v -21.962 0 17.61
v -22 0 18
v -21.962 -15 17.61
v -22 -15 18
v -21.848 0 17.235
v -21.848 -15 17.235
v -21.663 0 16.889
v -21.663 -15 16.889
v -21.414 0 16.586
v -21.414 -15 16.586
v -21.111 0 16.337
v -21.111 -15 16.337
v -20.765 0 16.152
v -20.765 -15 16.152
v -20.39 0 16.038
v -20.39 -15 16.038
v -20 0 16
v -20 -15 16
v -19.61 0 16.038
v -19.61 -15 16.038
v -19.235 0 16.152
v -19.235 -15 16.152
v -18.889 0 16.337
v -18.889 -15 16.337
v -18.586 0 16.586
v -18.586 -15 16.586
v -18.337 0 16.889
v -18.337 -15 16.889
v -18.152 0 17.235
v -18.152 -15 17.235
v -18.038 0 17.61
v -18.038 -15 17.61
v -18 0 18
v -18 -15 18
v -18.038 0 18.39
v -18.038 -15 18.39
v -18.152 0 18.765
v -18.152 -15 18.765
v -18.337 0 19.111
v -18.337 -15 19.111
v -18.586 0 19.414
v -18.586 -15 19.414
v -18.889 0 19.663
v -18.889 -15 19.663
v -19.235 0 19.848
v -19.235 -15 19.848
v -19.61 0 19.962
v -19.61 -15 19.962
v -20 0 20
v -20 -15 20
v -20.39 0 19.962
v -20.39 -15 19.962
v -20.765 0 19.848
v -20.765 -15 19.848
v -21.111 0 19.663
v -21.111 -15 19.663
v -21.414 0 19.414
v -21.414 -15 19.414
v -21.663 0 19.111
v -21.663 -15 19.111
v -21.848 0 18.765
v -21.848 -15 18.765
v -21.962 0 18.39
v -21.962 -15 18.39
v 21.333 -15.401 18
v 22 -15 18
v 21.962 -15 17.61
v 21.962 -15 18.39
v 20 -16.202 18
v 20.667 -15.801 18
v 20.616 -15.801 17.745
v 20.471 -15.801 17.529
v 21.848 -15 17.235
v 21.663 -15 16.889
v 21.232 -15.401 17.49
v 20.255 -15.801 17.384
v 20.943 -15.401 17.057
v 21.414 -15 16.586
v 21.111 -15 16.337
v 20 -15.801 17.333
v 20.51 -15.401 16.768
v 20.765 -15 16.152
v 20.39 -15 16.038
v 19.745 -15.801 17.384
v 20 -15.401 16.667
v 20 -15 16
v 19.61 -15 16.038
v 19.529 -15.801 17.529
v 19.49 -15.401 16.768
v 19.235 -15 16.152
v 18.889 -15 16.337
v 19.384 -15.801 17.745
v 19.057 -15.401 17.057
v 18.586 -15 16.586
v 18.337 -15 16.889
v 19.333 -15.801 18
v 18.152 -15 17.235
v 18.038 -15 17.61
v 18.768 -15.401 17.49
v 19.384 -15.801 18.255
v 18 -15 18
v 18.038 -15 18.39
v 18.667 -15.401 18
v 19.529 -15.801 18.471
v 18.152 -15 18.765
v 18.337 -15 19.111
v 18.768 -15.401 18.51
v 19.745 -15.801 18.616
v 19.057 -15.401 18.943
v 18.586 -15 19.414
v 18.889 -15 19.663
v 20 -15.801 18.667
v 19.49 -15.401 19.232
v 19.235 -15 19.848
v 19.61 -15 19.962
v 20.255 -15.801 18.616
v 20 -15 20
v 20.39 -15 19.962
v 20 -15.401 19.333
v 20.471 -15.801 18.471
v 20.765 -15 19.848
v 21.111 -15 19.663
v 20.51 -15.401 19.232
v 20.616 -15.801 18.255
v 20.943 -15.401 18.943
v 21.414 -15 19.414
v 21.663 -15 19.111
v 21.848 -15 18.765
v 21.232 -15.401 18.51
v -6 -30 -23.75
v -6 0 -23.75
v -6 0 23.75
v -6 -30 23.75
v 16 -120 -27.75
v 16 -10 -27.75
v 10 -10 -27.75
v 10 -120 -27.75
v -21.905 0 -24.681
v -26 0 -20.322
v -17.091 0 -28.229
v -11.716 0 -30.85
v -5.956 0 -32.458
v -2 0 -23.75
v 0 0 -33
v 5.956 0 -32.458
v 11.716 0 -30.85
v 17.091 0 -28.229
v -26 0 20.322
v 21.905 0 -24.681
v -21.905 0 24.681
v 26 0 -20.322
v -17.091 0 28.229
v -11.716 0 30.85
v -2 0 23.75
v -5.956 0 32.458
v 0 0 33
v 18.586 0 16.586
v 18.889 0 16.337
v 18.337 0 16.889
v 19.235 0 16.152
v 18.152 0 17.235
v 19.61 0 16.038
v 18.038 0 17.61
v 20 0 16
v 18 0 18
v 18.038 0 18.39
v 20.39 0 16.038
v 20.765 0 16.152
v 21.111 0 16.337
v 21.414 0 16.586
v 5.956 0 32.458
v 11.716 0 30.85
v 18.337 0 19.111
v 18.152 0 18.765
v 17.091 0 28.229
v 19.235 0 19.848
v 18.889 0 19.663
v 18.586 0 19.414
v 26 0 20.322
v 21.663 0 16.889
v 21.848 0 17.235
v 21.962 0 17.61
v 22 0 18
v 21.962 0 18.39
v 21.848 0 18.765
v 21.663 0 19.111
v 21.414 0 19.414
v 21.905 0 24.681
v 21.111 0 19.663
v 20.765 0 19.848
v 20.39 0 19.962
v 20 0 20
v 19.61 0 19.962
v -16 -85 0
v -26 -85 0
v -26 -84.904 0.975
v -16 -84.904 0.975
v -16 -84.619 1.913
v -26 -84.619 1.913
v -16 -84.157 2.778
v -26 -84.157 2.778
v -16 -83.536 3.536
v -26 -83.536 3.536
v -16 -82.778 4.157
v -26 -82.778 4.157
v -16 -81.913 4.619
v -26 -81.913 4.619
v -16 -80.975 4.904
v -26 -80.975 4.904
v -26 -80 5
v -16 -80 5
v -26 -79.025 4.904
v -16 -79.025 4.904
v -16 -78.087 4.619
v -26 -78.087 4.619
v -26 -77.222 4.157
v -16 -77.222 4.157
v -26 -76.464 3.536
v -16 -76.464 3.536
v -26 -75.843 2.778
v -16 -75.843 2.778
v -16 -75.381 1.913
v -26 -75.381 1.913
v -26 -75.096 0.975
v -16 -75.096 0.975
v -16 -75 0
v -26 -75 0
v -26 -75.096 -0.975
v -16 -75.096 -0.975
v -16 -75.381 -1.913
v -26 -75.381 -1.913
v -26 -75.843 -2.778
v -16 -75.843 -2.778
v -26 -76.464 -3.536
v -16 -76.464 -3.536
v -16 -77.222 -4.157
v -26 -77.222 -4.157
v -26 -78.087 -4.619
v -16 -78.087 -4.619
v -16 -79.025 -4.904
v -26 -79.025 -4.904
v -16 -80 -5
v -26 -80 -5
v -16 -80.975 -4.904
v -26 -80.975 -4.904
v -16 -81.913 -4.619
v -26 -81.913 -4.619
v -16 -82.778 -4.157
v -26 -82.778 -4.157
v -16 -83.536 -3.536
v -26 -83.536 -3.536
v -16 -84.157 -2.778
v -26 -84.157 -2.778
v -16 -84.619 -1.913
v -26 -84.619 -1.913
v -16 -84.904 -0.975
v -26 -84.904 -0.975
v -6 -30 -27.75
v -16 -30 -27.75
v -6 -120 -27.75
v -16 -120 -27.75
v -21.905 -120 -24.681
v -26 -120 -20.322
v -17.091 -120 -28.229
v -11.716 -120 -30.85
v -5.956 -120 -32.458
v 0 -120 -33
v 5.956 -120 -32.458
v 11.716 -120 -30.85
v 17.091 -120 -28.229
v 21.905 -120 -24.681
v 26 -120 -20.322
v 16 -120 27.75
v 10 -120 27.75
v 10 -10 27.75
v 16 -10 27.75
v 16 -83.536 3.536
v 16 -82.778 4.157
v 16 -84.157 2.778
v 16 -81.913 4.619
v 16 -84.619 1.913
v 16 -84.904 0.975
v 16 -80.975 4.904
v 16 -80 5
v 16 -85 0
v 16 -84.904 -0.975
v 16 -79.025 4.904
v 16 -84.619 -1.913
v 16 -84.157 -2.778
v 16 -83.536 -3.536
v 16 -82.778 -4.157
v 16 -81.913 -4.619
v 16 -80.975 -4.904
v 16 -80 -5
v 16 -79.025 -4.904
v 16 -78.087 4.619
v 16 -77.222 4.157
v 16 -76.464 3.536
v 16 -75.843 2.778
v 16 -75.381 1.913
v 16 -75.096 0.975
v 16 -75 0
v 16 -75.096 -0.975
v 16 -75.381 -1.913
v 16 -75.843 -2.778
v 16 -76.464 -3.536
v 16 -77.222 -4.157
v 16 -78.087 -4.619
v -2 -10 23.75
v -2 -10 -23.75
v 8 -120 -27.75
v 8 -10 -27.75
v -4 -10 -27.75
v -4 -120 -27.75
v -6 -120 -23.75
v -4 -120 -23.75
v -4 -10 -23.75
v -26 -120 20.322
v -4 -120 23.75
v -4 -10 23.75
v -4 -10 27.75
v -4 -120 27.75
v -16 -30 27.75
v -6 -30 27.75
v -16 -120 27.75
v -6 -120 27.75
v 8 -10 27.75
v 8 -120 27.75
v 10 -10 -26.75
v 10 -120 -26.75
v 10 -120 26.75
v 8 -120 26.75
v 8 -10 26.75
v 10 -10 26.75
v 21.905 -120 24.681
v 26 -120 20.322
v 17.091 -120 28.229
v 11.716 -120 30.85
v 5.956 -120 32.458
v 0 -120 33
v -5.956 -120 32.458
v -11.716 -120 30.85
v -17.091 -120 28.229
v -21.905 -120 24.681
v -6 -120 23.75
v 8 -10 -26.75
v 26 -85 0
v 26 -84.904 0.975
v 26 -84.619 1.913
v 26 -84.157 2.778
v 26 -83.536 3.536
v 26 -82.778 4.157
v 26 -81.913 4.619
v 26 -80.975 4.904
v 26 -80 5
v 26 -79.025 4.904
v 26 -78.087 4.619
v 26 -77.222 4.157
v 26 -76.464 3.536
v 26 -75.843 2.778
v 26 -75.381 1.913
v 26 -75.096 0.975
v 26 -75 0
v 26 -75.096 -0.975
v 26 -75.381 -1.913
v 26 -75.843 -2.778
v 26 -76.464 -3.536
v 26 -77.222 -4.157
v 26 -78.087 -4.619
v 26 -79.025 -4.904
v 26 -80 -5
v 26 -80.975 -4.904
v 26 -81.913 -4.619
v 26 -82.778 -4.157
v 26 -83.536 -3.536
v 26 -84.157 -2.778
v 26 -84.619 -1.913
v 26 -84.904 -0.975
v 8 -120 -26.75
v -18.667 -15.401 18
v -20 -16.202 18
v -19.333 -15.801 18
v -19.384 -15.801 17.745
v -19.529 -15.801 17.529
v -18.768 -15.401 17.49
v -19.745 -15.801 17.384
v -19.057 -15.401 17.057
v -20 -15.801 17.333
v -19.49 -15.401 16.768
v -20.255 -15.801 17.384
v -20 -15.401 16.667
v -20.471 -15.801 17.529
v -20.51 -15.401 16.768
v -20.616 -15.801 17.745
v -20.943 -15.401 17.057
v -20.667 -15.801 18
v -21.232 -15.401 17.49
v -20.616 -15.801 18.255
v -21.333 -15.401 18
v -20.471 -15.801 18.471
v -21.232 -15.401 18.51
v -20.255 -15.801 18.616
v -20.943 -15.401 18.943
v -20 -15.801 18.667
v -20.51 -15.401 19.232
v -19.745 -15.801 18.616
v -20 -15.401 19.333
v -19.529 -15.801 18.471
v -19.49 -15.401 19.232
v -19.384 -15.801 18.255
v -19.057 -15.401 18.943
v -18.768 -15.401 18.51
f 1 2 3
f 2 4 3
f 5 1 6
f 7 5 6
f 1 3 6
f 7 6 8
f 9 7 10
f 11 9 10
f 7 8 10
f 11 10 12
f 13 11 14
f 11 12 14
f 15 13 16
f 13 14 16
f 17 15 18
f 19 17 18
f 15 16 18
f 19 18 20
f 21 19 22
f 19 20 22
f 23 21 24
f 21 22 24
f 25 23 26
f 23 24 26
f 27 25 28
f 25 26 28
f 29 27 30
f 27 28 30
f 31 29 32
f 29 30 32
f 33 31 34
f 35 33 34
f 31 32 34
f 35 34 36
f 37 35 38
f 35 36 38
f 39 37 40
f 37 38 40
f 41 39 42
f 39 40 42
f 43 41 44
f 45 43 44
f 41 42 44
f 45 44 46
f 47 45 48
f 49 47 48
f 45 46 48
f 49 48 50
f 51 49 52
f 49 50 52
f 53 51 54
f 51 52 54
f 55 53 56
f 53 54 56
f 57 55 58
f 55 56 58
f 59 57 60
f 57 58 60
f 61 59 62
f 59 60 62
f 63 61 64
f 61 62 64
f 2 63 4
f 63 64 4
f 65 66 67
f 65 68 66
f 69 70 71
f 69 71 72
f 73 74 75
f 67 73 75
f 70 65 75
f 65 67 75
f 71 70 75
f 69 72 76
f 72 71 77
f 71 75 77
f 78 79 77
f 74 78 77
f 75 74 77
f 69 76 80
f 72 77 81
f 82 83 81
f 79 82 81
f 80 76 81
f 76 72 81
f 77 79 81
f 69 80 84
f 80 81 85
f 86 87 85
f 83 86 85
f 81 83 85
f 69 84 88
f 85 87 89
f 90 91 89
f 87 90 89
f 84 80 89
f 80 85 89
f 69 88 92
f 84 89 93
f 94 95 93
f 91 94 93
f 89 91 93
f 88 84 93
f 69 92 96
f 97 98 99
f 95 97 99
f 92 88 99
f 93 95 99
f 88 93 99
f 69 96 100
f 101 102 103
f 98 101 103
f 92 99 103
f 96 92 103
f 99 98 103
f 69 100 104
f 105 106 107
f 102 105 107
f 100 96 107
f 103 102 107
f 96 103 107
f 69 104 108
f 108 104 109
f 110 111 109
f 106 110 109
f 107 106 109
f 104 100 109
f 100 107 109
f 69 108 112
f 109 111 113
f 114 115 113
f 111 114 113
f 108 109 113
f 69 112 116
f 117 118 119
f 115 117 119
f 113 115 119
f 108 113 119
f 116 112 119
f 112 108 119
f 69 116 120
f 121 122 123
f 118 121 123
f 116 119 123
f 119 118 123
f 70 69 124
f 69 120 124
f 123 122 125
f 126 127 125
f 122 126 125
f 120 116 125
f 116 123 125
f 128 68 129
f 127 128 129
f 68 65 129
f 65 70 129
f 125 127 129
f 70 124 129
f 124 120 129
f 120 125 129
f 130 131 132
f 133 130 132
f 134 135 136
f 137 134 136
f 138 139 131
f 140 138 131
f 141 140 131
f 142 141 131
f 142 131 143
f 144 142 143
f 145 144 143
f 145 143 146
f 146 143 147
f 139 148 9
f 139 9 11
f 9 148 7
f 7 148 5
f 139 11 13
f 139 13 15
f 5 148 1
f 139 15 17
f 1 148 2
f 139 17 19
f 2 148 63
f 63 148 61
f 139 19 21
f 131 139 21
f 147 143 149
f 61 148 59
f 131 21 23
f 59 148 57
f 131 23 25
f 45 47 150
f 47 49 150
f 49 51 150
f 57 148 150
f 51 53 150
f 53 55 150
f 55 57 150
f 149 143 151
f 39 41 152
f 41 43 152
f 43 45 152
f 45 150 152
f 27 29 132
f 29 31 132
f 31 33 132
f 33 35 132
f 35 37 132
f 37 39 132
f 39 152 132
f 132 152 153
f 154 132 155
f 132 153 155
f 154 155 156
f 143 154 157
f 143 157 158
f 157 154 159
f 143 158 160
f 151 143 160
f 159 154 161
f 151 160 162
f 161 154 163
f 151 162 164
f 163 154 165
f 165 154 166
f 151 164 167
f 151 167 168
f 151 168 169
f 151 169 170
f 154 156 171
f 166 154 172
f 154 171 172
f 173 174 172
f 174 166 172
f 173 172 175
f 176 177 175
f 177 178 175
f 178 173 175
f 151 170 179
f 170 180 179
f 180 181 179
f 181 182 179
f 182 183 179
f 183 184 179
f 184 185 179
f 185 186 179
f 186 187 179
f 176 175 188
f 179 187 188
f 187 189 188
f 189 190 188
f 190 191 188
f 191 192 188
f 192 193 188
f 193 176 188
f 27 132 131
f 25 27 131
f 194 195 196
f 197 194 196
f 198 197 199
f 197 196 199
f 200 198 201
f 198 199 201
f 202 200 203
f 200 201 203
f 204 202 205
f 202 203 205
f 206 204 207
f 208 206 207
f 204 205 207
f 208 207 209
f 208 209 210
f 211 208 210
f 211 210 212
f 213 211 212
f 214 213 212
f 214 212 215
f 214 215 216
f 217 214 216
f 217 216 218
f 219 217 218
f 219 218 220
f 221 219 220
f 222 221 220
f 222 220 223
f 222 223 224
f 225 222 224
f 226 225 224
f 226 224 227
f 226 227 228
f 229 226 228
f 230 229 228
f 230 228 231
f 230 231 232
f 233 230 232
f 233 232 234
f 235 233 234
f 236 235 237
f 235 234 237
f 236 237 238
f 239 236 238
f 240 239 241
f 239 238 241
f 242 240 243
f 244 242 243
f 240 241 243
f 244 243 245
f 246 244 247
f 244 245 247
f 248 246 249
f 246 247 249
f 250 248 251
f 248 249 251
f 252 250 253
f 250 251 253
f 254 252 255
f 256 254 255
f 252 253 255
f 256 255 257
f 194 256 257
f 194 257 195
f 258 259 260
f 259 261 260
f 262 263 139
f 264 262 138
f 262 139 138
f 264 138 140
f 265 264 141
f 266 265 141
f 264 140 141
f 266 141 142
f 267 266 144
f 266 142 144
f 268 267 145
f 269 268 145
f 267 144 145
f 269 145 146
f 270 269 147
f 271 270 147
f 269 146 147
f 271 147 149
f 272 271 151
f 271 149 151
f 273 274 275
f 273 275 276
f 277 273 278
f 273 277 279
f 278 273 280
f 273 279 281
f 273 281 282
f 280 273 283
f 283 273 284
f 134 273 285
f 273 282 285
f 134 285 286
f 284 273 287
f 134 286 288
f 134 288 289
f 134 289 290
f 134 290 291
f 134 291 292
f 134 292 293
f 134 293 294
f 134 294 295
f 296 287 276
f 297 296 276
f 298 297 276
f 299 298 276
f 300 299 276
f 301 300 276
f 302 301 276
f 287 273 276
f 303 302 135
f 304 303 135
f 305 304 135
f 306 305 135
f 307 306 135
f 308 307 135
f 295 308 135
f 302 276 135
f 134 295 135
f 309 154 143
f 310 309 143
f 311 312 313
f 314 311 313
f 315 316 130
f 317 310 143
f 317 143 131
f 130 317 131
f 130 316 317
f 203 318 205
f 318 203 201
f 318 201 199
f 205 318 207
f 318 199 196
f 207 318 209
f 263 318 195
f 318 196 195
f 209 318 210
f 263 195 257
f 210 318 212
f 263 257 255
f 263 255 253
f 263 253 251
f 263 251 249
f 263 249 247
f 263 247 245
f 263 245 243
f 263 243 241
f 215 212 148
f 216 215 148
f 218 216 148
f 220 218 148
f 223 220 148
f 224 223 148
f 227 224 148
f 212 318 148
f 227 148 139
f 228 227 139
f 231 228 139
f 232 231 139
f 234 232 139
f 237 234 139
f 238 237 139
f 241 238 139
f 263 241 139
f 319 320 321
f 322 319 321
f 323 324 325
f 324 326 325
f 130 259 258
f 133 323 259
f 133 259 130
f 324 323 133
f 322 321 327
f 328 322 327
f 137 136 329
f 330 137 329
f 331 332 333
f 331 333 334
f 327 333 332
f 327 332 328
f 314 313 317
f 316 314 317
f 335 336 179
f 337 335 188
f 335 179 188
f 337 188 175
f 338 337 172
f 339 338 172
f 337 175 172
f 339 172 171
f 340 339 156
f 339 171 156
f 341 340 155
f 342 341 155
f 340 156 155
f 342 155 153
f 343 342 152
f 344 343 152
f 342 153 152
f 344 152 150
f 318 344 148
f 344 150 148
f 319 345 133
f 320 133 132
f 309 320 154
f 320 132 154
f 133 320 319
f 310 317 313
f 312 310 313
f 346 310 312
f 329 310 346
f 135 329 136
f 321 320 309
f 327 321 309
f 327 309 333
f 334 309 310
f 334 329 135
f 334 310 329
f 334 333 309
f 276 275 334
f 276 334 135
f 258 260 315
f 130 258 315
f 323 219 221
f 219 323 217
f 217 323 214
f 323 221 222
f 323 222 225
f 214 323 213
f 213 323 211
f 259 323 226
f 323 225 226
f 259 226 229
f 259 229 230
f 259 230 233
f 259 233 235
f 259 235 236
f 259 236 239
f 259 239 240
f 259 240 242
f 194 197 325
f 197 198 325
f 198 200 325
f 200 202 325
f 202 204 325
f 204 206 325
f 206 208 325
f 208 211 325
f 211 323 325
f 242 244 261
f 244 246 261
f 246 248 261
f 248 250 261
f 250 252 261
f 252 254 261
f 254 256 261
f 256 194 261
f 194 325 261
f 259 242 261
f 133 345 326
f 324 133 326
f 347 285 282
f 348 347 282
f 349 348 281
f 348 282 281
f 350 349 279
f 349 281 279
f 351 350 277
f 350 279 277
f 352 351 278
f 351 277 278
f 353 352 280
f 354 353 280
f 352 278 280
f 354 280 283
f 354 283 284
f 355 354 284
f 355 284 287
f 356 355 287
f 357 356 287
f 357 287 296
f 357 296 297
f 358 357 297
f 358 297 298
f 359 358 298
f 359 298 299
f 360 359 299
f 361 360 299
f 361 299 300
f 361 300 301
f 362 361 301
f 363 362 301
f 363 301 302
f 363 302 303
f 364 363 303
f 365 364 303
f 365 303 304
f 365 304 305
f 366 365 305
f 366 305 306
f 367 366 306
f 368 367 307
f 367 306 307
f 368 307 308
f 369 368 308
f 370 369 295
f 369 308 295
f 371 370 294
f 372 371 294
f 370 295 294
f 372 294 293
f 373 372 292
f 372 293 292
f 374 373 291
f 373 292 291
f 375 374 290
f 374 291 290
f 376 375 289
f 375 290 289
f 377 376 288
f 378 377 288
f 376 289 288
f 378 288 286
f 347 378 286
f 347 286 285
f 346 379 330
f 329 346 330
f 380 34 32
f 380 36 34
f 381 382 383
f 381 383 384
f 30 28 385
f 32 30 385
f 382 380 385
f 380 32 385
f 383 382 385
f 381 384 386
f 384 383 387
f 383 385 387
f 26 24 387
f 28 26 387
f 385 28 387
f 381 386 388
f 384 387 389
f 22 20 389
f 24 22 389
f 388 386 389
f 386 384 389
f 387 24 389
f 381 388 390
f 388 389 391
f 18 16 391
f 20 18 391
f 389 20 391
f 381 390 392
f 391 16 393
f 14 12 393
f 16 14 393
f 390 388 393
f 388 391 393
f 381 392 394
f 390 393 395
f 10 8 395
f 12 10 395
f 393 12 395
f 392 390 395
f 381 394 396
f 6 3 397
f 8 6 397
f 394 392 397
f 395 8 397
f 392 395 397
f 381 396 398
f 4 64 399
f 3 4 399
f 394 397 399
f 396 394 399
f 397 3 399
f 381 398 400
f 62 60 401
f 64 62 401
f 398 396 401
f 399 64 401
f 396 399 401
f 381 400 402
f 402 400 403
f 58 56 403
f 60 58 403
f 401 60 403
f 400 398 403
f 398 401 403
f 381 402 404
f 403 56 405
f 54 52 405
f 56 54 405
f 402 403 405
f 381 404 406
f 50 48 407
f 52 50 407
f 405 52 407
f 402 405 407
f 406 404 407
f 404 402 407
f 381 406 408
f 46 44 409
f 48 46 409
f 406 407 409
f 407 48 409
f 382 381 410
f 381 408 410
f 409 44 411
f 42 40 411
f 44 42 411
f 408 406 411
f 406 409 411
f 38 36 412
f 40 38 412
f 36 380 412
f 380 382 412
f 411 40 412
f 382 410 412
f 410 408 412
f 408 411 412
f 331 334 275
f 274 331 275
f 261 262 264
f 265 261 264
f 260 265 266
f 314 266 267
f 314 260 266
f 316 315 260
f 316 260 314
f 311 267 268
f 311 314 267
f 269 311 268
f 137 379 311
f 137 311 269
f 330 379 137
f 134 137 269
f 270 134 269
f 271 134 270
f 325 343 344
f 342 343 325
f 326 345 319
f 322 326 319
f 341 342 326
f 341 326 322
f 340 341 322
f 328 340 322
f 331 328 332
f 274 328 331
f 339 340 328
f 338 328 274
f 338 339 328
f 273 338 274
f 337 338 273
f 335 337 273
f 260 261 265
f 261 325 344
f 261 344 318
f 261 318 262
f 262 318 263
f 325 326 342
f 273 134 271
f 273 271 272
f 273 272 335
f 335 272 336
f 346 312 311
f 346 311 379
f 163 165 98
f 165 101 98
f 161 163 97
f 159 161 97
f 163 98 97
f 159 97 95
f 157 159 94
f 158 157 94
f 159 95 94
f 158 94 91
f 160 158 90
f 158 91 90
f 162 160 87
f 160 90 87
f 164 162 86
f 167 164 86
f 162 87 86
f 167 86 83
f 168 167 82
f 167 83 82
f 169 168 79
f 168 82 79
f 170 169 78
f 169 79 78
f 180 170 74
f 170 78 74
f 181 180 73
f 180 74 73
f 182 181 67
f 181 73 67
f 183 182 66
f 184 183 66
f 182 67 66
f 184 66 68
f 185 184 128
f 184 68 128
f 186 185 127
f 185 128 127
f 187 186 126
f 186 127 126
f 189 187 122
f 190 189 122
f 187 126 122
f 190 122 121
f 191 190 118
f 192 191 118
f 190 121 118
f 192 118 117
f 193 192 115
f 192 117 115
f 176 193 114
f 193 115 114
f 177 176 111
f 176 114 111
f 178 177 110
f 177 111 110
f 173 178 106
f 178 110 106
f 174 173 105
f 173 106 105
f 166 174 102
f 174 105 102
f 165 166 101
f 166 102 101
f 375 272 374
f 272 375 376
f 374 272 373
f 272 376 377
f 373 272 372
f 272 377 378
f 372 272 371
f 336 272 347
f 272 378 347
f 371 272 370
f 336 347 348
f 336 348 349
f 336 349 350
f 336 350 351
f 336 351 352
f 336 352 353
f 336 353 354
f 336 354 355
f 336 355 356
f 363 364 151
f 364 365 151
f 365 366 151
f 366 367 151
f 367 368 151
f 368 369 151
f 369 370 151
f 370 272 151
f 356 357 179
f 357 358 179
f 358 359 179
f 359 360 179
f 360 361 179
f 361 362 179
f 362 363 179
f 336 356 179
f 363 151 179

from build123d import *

# Parameters (mm, degrees)
F1_DEPTH  = 120
F2_DEPTH  = 10
F3_DEPTH  = 45
F4_D      = 4
F4_DEPTH  = 15
F4_TIP    = 1.2017212381
F6_D      = 10
F7_DEPTH  = 15
F8_W      = 2
F8_H      = 1
F9_DEPTH  = 110
F10_DEPTH = 2


with BuildPart() as f1:
    # F0 (on Front) → F1 (new body)
    with BuildSketch(Plane.XZ):
        with BuildLine():
            Line((26, -20.3224014329), (26, 20.3224014329))
            ThreePointArc((26, 20.3224014329), (0, 33), (-26, 20.3224014329))
            Line((-26, 20.3224014329), (-26, -20.3224014329))
            ThreePointArc((-26, -20.3224014329), (0, -33), (26, -20.3224014329))
        make_face()
        Polygon((-16, -27.75), (-16, 27.75), (-6, 27.75), (-6, 23.75), (-4, 23.75), (-4, 27.75), (16, 27.75), (16, -27.75), (-4, -27.75), (-4, -23.75), (-6, -23.75), (-6, -27.75), align=None, mode=Mode.SUBTRACT)
    extrude(amount=F1_DEPTH)

    # F0 (on Front) → F2 (join)
    with BuildSketch(Plane.XZ):
        Polygon((-4, 27.75), (-4, 23.75), (-4, -23.75), (-4, -27.75), (16, -27.75), (16, 27.75), align=None)
    extrude(amount=F2_DEPTH)

    # F0 (on Front) → F3 (join)
    with BuildSketch(Plane.XZ):
        Polygon((-6, 27.75), (-16, 27.75), (-16, -27.75), (-6, -27.75), (-6, -23.75), (-6, 23.75), align=None)
    extrude(amount=F3_DEPTH)

    # F4
    with Locations(Plane(origin=(0, 0, 0), x_dir=(1, 0, 0), z_dir=(0, 1, 0))):
        with Locations((20, -18), (-20, -18)):
            Hole(F4_D / 2, depth=F4_DEPTH)
            with Locations((0, 0, -(F4_DEPTH + F4_TIP / 2))):  # 118° drill point
                Cone(0, F4_D / 2, F4_TIP, mode=Mode.SUBTRACT)

    # F6 (through all)
    with Locations(Plane.YZ.offset(26)):
        with Locations((-80, 0)):
            Hole(F6_D / 2)

    # F7 (cut): a face of the model
    f7_faces = [f1.faces().sort_by_distance(p)[0] for p in [
        (-11, -45, 0),
    ]]
    extrude(f7_faces, amount=-F7_DEPTH, mode=Mode.SUBTRACT)

    # F8 (on face) → F9 (join, through all)
    with BuildSketch(Plane.XZ.offset(120)):
        with Locations((9, 27.25)):
            Rectangle(F8_W, F8_H)
        with Locations((9, -27.25)):
            Rectangle(F8_W, F8_H)
    extrude(amount=-F9_DEPTH)

    # F10 (cut): a face of the model
    f10_faces = [f1.faces().sort_by_distance(p)[0] for p in [
        (-4, -5, 0),
    ]]
    extrude(f10_faces, amount=-F10_DEPTH, mode=Mode.SUBTRACT)


solid = f1.part
